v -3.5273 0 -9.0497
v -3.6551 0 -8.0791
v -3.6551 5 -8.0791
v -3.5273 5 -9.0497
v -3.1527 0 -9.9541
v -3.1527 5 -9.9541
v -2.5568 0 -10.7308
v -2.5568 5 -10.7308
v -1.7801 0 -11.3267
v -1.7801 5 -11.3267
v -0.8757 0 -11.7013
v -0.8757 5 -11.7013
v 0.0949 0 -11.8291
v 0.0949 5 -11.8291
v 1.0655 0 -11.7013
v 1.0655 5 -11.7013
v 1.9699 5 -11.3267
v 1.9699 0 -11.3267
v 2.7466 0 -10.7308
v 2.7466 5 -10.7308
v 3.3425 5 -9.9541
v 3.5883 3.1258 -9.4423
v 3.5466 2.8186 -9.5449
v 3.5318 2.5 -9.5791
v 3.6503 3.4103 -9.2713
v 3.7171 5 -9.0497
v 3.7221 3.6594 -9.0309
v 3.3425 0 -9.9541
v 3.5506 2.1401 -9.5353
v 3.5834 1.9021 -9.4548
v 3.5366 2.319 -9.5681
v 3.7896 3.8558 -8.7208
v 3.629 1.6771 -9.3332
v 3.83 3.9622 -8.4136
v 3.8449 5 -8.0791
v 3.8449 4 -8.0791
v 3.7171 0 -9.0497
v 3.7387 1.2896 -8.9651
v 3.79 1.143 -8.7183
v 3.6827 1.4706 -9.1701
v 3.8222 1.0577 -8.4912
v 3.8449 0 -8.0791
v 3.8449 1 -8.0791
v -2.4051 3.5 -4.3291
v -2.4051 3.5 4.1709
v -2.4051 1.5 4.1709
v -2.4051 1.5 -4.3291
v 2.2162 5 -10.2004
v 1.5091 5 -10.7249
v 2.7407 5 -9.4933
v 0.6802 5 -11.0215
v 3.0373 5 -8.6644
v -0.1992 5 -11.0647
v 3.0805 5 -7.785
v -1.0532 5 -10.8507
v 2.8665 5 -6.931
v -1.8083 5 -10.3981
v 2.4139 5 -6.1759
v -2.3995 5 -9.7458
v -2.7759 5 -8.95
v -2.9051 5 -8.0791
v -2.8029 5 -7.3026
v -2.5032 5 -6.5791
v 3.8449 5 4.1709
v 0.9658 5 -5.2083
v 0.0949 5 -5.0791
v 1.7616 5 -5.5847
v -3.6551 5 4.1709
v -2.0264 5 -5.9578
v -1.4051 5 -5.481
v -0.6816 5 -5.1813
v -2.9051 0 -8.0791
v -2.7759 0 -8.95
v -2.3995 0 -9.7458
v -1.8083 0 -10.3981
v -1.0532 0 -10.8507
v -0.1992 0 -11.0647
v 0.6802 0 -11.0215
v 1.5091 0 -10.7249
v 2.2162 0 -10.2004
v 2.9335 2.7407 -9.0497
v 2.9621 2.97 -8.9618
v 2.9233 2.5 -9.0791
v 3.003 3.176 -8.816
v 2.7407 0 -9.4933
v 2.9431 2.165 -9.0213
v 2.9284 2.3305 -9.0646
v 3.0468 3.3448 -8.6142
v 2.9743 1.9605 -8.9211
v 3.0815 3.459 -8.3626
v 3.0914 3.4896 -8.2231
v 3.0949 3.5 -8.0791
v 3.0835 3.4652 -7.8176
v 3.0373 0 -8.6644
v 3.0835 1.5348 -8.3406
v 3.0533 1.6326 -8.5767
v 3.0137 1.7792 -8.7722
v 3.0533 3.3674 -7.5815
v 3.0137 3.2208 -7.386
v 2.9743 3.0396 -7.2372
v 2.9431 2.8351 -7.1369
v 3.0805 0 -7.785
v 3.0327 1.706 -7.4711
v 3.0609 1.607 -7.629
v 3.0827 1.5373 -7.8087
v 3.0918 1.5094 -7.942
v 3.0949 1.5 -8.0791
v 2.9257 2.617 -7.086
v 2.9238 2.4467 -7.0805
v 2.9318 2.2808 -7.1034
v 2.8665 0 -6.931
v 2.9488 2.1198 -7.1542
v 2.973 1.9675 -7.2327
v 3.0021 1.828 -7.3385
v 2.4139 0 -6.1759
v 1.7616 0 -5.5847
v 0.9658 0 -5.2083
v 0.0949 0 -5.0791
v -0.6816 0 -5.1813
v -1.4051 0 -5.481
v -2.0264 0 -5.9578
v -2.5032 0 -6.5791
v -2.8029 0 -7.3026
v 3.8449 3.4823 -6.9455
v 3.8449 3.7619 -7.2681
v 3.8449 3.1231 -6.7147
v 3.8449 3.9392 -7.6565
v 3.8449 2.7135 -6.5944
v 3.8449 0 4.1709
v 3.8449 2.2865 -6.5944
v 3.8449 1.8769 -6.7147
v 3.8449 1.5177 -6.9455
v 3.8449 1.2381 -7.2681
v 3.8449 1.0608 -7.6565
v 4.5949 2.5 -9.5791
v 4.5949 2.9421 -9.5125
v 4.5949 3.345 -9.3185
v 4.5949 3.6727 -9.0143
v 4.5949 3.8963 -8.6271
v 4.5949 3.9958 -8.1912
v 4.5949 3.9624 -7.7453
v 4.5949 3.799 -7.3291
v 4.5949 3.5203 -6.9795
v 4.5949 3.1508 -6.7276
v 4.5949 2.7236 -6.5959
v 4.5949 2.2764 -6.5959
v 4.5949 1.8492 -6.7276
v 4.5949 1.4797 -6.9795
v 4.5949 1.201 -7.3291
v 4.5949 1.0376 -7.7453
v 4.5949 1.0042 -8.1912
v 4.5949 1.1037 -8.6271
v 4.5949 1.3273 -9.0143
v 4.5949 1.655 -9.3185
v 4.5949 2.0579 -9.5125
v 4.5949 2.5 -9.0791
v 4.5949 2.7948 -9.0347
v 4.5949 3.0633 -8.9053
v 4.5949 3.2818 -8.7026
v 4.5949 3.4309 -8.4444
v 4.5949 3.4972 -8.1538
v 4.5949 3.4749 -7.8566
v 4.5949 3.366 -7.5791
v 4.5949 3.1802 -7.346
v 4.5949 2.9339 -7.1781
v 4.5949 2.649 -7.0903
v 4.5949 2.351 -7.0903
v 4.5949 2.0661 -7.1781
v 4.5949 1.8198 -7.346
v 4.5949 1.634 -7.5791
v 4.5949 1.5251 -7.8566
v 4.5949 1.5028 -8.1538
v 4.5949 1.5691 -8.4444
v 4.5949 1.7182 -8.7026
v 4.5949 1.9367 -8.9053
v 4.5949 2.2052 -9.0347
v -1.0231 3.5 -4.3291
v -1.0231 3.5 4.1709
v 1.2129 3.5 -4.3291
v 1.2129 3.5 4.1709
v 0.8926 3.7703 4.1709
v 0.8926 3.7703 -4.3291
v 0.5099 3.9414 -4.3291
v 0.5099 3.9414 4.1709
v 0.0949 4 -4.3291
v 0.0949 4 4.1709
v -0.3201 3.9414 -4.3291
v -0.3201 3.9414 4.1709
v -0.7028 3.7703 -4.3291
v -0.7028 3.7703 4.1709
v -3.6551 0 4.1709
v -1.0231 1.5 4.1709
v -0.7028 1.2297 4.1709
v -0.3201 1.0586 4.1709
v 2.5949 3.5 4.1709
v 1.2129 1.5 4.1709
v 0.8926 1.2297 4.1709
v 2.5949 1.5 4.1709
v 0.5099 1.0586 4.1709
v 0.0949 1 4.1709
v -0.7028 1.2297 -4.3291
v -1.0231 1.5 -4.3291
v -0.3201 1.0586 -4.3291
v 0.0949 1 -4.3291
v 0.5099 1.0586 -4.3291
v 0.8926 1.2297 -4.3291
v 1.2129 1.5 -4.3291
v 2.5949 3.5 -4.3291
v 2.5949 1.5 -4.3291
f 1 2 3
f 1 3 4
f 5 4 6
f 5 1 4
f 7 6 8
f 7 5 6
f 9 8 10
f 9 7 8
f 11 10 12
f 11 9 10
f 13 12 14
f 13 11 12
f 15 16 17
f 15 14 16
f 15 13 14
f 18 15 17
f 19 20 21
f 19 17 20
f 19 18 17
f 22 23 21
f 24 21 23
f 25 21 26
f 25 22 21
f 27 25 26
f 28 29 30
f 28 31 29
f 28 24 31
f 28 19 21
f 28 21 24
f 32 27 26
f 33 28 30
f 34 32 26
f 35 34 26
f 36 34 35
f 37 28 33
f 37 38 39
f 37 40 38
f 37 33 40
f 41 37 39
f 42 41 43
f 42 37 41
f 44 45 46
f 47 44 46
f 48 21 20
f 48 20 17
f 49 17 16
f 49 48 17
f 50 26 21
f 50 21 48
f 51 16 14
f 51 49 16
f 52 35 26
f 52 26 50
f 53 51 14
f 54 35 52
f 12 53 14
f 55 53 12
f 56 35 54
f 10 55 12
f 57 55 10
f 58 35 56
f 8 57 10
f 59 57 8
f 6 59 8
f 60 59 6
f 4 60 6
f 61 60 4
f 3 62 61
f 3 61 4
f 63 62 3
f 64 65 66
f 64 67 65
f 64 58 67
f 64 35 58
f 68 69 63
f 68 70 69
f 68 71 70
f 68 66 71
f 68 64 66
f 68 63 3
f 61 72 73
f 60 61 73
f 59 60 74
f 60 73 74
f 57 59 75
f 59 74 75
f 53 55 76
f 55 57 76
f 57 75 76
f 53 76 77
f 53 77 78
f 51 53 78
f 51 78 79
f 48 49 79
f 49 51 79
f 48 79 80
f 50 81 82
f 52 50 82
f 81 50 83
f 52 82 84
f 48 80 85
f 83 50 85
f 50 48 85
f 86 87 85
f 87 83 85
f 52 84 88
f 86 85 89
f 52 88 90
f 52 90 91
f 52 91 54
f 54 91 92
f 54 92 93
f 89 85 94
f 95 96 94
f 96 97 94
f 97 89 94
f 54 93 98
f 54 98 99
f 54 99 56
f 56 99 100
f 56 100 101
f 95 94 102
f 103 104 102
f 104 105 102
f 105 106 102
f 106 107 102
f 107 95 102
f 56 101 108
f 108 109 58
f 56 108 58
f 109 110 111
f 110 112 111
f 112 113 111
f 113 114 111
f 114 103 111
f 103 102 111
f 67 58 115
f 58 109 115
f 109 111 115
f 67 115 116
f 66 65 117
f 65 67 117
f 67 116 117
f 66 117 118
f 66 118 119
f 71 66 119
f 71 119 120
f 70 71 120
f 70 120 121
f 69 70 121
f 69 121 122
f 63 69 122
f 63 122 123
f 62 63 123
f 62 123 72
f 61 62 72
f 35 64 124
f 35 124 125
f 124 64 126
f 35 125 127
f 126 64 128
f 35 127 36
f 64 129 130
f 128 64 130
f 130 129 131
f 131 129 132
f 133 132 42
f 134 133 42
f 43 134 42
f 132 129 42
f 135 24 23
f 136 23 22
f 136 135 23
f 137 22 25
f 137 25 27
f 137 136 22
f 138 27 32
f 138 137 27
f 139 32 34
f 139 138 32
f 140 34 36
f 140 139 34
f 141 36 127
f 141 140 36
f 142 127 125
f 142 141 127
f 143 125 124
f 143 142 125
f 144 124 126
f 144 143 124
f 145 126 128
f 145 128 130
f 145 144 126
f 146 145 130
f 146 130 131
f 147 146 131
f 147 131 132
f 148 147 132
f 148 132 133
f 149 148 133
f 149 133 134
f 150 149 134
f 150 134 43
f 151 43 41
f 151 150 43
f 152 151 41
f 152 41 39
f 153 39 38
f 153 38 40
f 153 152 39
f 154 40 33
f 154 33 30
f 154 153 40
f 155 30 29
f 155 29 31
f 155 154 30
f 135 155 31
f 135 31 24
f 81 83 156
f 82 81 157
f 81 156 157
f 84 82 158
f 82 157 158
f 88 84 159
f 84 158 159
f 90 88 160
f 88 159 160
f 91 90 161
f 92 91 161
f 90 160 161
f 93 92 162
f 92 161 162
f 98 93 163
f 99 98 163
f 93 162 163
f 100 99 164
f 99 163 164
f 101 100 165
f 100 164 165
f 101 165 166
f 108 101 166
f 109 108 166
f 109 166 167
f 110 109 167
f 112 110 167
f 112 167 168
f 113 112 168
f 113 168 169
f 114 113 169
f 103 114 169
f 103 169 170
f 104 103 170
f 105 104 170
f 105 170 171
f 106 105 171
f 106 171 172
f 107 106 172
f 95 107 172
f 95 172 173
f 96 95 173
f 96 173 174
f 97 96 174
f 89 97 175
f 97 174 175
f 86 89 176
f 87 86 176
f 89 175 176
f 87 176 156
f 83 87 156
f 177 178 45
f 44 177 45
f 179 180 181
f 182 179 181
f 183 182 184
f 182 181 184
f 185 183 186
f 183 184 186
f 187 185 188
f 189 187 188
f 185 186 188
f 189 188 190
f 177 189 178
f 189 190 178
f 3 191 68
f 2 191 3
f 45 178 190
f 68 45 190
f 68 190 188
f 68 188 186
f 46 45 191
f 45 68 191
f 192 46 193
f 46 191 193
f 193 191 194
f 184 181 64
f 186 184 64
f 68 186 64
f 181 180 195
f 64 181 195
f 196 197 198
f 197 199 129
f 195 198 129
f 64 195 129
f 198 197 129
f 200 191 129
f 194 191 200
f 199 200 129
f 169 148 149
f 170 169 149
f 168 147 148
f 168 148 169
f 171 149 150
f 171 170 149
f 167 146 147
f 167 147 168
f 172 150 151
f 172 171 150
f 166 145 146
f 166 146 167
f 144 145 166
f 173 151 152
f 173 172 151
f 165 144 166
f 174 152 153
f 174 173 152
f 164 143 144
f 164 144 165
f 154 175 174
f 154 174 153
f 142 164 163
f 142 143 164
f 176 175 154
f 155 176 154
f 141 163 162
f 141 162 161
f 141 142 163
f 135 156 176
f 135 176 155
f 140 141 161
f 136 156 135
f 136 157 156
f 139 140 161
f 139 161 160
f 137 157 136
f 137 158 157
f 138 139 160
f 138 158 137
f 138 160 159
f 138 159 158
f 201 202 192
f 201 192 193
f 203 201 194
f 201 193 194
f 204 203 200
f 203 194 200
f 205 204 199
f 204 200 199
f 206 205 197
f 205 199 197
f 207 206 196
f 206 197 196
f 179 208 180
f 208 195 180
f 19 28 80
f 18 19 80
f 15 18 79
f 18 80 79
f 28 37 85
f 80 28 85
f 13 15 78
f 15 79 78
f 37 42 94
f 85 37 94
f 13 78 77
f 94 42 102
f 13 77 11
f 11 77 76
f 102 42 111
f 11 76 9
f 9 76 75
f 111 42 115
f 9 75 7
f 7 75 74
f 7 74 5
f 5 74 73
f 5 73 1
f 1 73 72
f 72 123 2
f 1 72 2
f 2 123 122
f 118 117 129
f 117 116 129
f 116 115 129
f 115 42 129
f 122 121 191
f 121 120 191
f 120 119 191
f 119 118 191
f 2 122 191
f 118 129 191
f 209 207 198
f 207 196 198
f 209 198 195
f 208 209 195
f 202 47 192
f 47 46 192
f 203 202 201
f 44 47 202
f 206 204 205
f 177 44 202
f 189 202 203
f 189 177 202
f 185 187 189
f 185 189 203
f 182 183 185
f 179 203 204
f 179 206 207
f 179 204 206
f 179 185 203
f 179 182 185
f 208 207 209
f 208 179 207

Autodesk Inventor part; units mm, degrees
ref_plane "YZ Plane" through (0, 0, 0) normal (1, 0, 0) x (0, 1, 0)
ref_plane "XZ Plane" through (0, 0, 0) normal (0, 1, 0) x (-1, 0, 0)
ref_plane "XY Plane" through (0, 0, 0) normal (0, 0, 1) x (1, 0, 0)
sketch "Sketch1" plane through (0, 0, 0) normal (0, 1, 0) x (-1, 0, 0)
  line L0 (-0.0949, -0.0791) -> (-0.0949, -8.0791)
  circle A0 centre (-0.0949, -8.0791) radius 3
  line L1 (-0.0949, -0.0791) -> (-0.0949, 7.9209)
  circle A1 centre (-0.0949, 7.9209) radius 2.5
  circle A2 centre (-0.0949, 7.9209) radius 3.75
  circle A3 centre (-0.0949, -8.0791) radius 3.75
  line L2 (3.6551, 7.9209) -> (3.6551, -8.0791)
  line L3 (-3.8449, 7.9209) -> (-3.8449, -8.0791)
  line L4 (3.6551, 4.1709) -> (-3.8449, 4.1709)
  line L5 (3.6551, -4.3291) -> (-3.8449, -4.3291)
  point P0 (0, 0)
  dimension "d0" = 8
  dimension "d1" = 6
  dimension "d2" = 8
  dimension "d3" = 5
  dimension "d4" = 7.5
  dimension "d5" = 7.5
extrude "Extrusion1" add sketch "Sketch1" along normal blind 5 contours L1 L4 L2 L5 L0 | L0 L5 L3 L4 L1 | L5 L2 A3 | A3 | A3 L3 L5
sketch "Sketch2" plane through (-3.6551, 0, 4.1709) normal (0, 0, 1) x (1, 0, 0)
  line L0 (0, 5) -> (7.5, 5) projected
  line L1 (0, 0) -> (7.5, 0)
  line L2 (7.5, 0) -> (7.5, 5)
  line L3 (7.5, 5) -> (0, 5)
  line L4 (0, 5) -> (0, 0)
  line L5 (7.5, 5) -> (0, 5)
  line L6 (0, 5) -> (0, 0)
  line L7 (0, 0) -> (7.5, 0)
  line L8 (7.5, 0) -> (7.5, 5)
  line L9 (7.5, 5) -> (0, 0) construction
  line L10 (0, 5) -> (7.5, 0) construction
  circle A0 centre (3.75, 2.5) radius 1.5
  line L11 (6.25, 3.5) -> (1.25, 3.5)
  line L12 (1.25, 3.5) -> (1.25, 1.5)
  line L13 (1.25, 1.5) -> (6.25, 1.5)
  line L14 (6.25, 1.5) -> (6.25, 3.5)
  line L15 (6.25, 3.5) -> (1.25, 1.5) construction
  line L16 (1.25, 3.5) -> (6.25, 1.5) construction
  point P0 (3.6551, 0)
  point P1 (4.868, 1.5)
  point P2 (4.868, 3.5)
  point P3 (2.632, 3.5)
  point P4 (2.632, 1.5)
  dimension "d8" = 3
  dimension "d9" = 5
  dimension "d10" = 2
extrude "Extrusion2" cut sketch "Sketch2" against normal blind 8.5 contours A0 L13 L11 | A0 L11 L14 L13 | L11 A0 | A0 L13 | A0 L13 L12 L11
sketch "Sketch3" plane through (0, 5, 0) normal (0, 1, 0) x (1, 0, 0)
  line L0 (1.213, 4.3291) -> (2.5949, 4.3291) projected
  line L1 (-3.6551, -4.1709) -> (3.8449, -4.1709) projected
  point P0 (0, 0)
  dimension "d13" = 8.5
sketch "Sketch4" plane through (3.8449, 0, 4.1709) normal (1, 0, 0) x (0, 0, -1)
  line L0 (12.25, 0) -> (12.25, 5) projected
  circle A0 centre (12.25, 2.5) radius 1.5
  point P0 (4.1709, 0)
  dimension "d14" = 3
extrude "Extrusion3" add sketch "Sketch4" along normal mid plane 1.5
sketch "Sketch5" plane through (4.5949, 2.5, -8.0791) normal (1, 0, 0) x (0, 0, -1)
  line L0 (0, -2.5) -> (0, 2.5) projected
  circle A0 centre (0, 0) radius 1
  point P0 (-8.0791, -2.5)
  dimension "d17" = 2
extrude "Extrusion4" cut sketch "Sketch5" against normal blind 3.0875
properties part number "Link_OutsideV3"
